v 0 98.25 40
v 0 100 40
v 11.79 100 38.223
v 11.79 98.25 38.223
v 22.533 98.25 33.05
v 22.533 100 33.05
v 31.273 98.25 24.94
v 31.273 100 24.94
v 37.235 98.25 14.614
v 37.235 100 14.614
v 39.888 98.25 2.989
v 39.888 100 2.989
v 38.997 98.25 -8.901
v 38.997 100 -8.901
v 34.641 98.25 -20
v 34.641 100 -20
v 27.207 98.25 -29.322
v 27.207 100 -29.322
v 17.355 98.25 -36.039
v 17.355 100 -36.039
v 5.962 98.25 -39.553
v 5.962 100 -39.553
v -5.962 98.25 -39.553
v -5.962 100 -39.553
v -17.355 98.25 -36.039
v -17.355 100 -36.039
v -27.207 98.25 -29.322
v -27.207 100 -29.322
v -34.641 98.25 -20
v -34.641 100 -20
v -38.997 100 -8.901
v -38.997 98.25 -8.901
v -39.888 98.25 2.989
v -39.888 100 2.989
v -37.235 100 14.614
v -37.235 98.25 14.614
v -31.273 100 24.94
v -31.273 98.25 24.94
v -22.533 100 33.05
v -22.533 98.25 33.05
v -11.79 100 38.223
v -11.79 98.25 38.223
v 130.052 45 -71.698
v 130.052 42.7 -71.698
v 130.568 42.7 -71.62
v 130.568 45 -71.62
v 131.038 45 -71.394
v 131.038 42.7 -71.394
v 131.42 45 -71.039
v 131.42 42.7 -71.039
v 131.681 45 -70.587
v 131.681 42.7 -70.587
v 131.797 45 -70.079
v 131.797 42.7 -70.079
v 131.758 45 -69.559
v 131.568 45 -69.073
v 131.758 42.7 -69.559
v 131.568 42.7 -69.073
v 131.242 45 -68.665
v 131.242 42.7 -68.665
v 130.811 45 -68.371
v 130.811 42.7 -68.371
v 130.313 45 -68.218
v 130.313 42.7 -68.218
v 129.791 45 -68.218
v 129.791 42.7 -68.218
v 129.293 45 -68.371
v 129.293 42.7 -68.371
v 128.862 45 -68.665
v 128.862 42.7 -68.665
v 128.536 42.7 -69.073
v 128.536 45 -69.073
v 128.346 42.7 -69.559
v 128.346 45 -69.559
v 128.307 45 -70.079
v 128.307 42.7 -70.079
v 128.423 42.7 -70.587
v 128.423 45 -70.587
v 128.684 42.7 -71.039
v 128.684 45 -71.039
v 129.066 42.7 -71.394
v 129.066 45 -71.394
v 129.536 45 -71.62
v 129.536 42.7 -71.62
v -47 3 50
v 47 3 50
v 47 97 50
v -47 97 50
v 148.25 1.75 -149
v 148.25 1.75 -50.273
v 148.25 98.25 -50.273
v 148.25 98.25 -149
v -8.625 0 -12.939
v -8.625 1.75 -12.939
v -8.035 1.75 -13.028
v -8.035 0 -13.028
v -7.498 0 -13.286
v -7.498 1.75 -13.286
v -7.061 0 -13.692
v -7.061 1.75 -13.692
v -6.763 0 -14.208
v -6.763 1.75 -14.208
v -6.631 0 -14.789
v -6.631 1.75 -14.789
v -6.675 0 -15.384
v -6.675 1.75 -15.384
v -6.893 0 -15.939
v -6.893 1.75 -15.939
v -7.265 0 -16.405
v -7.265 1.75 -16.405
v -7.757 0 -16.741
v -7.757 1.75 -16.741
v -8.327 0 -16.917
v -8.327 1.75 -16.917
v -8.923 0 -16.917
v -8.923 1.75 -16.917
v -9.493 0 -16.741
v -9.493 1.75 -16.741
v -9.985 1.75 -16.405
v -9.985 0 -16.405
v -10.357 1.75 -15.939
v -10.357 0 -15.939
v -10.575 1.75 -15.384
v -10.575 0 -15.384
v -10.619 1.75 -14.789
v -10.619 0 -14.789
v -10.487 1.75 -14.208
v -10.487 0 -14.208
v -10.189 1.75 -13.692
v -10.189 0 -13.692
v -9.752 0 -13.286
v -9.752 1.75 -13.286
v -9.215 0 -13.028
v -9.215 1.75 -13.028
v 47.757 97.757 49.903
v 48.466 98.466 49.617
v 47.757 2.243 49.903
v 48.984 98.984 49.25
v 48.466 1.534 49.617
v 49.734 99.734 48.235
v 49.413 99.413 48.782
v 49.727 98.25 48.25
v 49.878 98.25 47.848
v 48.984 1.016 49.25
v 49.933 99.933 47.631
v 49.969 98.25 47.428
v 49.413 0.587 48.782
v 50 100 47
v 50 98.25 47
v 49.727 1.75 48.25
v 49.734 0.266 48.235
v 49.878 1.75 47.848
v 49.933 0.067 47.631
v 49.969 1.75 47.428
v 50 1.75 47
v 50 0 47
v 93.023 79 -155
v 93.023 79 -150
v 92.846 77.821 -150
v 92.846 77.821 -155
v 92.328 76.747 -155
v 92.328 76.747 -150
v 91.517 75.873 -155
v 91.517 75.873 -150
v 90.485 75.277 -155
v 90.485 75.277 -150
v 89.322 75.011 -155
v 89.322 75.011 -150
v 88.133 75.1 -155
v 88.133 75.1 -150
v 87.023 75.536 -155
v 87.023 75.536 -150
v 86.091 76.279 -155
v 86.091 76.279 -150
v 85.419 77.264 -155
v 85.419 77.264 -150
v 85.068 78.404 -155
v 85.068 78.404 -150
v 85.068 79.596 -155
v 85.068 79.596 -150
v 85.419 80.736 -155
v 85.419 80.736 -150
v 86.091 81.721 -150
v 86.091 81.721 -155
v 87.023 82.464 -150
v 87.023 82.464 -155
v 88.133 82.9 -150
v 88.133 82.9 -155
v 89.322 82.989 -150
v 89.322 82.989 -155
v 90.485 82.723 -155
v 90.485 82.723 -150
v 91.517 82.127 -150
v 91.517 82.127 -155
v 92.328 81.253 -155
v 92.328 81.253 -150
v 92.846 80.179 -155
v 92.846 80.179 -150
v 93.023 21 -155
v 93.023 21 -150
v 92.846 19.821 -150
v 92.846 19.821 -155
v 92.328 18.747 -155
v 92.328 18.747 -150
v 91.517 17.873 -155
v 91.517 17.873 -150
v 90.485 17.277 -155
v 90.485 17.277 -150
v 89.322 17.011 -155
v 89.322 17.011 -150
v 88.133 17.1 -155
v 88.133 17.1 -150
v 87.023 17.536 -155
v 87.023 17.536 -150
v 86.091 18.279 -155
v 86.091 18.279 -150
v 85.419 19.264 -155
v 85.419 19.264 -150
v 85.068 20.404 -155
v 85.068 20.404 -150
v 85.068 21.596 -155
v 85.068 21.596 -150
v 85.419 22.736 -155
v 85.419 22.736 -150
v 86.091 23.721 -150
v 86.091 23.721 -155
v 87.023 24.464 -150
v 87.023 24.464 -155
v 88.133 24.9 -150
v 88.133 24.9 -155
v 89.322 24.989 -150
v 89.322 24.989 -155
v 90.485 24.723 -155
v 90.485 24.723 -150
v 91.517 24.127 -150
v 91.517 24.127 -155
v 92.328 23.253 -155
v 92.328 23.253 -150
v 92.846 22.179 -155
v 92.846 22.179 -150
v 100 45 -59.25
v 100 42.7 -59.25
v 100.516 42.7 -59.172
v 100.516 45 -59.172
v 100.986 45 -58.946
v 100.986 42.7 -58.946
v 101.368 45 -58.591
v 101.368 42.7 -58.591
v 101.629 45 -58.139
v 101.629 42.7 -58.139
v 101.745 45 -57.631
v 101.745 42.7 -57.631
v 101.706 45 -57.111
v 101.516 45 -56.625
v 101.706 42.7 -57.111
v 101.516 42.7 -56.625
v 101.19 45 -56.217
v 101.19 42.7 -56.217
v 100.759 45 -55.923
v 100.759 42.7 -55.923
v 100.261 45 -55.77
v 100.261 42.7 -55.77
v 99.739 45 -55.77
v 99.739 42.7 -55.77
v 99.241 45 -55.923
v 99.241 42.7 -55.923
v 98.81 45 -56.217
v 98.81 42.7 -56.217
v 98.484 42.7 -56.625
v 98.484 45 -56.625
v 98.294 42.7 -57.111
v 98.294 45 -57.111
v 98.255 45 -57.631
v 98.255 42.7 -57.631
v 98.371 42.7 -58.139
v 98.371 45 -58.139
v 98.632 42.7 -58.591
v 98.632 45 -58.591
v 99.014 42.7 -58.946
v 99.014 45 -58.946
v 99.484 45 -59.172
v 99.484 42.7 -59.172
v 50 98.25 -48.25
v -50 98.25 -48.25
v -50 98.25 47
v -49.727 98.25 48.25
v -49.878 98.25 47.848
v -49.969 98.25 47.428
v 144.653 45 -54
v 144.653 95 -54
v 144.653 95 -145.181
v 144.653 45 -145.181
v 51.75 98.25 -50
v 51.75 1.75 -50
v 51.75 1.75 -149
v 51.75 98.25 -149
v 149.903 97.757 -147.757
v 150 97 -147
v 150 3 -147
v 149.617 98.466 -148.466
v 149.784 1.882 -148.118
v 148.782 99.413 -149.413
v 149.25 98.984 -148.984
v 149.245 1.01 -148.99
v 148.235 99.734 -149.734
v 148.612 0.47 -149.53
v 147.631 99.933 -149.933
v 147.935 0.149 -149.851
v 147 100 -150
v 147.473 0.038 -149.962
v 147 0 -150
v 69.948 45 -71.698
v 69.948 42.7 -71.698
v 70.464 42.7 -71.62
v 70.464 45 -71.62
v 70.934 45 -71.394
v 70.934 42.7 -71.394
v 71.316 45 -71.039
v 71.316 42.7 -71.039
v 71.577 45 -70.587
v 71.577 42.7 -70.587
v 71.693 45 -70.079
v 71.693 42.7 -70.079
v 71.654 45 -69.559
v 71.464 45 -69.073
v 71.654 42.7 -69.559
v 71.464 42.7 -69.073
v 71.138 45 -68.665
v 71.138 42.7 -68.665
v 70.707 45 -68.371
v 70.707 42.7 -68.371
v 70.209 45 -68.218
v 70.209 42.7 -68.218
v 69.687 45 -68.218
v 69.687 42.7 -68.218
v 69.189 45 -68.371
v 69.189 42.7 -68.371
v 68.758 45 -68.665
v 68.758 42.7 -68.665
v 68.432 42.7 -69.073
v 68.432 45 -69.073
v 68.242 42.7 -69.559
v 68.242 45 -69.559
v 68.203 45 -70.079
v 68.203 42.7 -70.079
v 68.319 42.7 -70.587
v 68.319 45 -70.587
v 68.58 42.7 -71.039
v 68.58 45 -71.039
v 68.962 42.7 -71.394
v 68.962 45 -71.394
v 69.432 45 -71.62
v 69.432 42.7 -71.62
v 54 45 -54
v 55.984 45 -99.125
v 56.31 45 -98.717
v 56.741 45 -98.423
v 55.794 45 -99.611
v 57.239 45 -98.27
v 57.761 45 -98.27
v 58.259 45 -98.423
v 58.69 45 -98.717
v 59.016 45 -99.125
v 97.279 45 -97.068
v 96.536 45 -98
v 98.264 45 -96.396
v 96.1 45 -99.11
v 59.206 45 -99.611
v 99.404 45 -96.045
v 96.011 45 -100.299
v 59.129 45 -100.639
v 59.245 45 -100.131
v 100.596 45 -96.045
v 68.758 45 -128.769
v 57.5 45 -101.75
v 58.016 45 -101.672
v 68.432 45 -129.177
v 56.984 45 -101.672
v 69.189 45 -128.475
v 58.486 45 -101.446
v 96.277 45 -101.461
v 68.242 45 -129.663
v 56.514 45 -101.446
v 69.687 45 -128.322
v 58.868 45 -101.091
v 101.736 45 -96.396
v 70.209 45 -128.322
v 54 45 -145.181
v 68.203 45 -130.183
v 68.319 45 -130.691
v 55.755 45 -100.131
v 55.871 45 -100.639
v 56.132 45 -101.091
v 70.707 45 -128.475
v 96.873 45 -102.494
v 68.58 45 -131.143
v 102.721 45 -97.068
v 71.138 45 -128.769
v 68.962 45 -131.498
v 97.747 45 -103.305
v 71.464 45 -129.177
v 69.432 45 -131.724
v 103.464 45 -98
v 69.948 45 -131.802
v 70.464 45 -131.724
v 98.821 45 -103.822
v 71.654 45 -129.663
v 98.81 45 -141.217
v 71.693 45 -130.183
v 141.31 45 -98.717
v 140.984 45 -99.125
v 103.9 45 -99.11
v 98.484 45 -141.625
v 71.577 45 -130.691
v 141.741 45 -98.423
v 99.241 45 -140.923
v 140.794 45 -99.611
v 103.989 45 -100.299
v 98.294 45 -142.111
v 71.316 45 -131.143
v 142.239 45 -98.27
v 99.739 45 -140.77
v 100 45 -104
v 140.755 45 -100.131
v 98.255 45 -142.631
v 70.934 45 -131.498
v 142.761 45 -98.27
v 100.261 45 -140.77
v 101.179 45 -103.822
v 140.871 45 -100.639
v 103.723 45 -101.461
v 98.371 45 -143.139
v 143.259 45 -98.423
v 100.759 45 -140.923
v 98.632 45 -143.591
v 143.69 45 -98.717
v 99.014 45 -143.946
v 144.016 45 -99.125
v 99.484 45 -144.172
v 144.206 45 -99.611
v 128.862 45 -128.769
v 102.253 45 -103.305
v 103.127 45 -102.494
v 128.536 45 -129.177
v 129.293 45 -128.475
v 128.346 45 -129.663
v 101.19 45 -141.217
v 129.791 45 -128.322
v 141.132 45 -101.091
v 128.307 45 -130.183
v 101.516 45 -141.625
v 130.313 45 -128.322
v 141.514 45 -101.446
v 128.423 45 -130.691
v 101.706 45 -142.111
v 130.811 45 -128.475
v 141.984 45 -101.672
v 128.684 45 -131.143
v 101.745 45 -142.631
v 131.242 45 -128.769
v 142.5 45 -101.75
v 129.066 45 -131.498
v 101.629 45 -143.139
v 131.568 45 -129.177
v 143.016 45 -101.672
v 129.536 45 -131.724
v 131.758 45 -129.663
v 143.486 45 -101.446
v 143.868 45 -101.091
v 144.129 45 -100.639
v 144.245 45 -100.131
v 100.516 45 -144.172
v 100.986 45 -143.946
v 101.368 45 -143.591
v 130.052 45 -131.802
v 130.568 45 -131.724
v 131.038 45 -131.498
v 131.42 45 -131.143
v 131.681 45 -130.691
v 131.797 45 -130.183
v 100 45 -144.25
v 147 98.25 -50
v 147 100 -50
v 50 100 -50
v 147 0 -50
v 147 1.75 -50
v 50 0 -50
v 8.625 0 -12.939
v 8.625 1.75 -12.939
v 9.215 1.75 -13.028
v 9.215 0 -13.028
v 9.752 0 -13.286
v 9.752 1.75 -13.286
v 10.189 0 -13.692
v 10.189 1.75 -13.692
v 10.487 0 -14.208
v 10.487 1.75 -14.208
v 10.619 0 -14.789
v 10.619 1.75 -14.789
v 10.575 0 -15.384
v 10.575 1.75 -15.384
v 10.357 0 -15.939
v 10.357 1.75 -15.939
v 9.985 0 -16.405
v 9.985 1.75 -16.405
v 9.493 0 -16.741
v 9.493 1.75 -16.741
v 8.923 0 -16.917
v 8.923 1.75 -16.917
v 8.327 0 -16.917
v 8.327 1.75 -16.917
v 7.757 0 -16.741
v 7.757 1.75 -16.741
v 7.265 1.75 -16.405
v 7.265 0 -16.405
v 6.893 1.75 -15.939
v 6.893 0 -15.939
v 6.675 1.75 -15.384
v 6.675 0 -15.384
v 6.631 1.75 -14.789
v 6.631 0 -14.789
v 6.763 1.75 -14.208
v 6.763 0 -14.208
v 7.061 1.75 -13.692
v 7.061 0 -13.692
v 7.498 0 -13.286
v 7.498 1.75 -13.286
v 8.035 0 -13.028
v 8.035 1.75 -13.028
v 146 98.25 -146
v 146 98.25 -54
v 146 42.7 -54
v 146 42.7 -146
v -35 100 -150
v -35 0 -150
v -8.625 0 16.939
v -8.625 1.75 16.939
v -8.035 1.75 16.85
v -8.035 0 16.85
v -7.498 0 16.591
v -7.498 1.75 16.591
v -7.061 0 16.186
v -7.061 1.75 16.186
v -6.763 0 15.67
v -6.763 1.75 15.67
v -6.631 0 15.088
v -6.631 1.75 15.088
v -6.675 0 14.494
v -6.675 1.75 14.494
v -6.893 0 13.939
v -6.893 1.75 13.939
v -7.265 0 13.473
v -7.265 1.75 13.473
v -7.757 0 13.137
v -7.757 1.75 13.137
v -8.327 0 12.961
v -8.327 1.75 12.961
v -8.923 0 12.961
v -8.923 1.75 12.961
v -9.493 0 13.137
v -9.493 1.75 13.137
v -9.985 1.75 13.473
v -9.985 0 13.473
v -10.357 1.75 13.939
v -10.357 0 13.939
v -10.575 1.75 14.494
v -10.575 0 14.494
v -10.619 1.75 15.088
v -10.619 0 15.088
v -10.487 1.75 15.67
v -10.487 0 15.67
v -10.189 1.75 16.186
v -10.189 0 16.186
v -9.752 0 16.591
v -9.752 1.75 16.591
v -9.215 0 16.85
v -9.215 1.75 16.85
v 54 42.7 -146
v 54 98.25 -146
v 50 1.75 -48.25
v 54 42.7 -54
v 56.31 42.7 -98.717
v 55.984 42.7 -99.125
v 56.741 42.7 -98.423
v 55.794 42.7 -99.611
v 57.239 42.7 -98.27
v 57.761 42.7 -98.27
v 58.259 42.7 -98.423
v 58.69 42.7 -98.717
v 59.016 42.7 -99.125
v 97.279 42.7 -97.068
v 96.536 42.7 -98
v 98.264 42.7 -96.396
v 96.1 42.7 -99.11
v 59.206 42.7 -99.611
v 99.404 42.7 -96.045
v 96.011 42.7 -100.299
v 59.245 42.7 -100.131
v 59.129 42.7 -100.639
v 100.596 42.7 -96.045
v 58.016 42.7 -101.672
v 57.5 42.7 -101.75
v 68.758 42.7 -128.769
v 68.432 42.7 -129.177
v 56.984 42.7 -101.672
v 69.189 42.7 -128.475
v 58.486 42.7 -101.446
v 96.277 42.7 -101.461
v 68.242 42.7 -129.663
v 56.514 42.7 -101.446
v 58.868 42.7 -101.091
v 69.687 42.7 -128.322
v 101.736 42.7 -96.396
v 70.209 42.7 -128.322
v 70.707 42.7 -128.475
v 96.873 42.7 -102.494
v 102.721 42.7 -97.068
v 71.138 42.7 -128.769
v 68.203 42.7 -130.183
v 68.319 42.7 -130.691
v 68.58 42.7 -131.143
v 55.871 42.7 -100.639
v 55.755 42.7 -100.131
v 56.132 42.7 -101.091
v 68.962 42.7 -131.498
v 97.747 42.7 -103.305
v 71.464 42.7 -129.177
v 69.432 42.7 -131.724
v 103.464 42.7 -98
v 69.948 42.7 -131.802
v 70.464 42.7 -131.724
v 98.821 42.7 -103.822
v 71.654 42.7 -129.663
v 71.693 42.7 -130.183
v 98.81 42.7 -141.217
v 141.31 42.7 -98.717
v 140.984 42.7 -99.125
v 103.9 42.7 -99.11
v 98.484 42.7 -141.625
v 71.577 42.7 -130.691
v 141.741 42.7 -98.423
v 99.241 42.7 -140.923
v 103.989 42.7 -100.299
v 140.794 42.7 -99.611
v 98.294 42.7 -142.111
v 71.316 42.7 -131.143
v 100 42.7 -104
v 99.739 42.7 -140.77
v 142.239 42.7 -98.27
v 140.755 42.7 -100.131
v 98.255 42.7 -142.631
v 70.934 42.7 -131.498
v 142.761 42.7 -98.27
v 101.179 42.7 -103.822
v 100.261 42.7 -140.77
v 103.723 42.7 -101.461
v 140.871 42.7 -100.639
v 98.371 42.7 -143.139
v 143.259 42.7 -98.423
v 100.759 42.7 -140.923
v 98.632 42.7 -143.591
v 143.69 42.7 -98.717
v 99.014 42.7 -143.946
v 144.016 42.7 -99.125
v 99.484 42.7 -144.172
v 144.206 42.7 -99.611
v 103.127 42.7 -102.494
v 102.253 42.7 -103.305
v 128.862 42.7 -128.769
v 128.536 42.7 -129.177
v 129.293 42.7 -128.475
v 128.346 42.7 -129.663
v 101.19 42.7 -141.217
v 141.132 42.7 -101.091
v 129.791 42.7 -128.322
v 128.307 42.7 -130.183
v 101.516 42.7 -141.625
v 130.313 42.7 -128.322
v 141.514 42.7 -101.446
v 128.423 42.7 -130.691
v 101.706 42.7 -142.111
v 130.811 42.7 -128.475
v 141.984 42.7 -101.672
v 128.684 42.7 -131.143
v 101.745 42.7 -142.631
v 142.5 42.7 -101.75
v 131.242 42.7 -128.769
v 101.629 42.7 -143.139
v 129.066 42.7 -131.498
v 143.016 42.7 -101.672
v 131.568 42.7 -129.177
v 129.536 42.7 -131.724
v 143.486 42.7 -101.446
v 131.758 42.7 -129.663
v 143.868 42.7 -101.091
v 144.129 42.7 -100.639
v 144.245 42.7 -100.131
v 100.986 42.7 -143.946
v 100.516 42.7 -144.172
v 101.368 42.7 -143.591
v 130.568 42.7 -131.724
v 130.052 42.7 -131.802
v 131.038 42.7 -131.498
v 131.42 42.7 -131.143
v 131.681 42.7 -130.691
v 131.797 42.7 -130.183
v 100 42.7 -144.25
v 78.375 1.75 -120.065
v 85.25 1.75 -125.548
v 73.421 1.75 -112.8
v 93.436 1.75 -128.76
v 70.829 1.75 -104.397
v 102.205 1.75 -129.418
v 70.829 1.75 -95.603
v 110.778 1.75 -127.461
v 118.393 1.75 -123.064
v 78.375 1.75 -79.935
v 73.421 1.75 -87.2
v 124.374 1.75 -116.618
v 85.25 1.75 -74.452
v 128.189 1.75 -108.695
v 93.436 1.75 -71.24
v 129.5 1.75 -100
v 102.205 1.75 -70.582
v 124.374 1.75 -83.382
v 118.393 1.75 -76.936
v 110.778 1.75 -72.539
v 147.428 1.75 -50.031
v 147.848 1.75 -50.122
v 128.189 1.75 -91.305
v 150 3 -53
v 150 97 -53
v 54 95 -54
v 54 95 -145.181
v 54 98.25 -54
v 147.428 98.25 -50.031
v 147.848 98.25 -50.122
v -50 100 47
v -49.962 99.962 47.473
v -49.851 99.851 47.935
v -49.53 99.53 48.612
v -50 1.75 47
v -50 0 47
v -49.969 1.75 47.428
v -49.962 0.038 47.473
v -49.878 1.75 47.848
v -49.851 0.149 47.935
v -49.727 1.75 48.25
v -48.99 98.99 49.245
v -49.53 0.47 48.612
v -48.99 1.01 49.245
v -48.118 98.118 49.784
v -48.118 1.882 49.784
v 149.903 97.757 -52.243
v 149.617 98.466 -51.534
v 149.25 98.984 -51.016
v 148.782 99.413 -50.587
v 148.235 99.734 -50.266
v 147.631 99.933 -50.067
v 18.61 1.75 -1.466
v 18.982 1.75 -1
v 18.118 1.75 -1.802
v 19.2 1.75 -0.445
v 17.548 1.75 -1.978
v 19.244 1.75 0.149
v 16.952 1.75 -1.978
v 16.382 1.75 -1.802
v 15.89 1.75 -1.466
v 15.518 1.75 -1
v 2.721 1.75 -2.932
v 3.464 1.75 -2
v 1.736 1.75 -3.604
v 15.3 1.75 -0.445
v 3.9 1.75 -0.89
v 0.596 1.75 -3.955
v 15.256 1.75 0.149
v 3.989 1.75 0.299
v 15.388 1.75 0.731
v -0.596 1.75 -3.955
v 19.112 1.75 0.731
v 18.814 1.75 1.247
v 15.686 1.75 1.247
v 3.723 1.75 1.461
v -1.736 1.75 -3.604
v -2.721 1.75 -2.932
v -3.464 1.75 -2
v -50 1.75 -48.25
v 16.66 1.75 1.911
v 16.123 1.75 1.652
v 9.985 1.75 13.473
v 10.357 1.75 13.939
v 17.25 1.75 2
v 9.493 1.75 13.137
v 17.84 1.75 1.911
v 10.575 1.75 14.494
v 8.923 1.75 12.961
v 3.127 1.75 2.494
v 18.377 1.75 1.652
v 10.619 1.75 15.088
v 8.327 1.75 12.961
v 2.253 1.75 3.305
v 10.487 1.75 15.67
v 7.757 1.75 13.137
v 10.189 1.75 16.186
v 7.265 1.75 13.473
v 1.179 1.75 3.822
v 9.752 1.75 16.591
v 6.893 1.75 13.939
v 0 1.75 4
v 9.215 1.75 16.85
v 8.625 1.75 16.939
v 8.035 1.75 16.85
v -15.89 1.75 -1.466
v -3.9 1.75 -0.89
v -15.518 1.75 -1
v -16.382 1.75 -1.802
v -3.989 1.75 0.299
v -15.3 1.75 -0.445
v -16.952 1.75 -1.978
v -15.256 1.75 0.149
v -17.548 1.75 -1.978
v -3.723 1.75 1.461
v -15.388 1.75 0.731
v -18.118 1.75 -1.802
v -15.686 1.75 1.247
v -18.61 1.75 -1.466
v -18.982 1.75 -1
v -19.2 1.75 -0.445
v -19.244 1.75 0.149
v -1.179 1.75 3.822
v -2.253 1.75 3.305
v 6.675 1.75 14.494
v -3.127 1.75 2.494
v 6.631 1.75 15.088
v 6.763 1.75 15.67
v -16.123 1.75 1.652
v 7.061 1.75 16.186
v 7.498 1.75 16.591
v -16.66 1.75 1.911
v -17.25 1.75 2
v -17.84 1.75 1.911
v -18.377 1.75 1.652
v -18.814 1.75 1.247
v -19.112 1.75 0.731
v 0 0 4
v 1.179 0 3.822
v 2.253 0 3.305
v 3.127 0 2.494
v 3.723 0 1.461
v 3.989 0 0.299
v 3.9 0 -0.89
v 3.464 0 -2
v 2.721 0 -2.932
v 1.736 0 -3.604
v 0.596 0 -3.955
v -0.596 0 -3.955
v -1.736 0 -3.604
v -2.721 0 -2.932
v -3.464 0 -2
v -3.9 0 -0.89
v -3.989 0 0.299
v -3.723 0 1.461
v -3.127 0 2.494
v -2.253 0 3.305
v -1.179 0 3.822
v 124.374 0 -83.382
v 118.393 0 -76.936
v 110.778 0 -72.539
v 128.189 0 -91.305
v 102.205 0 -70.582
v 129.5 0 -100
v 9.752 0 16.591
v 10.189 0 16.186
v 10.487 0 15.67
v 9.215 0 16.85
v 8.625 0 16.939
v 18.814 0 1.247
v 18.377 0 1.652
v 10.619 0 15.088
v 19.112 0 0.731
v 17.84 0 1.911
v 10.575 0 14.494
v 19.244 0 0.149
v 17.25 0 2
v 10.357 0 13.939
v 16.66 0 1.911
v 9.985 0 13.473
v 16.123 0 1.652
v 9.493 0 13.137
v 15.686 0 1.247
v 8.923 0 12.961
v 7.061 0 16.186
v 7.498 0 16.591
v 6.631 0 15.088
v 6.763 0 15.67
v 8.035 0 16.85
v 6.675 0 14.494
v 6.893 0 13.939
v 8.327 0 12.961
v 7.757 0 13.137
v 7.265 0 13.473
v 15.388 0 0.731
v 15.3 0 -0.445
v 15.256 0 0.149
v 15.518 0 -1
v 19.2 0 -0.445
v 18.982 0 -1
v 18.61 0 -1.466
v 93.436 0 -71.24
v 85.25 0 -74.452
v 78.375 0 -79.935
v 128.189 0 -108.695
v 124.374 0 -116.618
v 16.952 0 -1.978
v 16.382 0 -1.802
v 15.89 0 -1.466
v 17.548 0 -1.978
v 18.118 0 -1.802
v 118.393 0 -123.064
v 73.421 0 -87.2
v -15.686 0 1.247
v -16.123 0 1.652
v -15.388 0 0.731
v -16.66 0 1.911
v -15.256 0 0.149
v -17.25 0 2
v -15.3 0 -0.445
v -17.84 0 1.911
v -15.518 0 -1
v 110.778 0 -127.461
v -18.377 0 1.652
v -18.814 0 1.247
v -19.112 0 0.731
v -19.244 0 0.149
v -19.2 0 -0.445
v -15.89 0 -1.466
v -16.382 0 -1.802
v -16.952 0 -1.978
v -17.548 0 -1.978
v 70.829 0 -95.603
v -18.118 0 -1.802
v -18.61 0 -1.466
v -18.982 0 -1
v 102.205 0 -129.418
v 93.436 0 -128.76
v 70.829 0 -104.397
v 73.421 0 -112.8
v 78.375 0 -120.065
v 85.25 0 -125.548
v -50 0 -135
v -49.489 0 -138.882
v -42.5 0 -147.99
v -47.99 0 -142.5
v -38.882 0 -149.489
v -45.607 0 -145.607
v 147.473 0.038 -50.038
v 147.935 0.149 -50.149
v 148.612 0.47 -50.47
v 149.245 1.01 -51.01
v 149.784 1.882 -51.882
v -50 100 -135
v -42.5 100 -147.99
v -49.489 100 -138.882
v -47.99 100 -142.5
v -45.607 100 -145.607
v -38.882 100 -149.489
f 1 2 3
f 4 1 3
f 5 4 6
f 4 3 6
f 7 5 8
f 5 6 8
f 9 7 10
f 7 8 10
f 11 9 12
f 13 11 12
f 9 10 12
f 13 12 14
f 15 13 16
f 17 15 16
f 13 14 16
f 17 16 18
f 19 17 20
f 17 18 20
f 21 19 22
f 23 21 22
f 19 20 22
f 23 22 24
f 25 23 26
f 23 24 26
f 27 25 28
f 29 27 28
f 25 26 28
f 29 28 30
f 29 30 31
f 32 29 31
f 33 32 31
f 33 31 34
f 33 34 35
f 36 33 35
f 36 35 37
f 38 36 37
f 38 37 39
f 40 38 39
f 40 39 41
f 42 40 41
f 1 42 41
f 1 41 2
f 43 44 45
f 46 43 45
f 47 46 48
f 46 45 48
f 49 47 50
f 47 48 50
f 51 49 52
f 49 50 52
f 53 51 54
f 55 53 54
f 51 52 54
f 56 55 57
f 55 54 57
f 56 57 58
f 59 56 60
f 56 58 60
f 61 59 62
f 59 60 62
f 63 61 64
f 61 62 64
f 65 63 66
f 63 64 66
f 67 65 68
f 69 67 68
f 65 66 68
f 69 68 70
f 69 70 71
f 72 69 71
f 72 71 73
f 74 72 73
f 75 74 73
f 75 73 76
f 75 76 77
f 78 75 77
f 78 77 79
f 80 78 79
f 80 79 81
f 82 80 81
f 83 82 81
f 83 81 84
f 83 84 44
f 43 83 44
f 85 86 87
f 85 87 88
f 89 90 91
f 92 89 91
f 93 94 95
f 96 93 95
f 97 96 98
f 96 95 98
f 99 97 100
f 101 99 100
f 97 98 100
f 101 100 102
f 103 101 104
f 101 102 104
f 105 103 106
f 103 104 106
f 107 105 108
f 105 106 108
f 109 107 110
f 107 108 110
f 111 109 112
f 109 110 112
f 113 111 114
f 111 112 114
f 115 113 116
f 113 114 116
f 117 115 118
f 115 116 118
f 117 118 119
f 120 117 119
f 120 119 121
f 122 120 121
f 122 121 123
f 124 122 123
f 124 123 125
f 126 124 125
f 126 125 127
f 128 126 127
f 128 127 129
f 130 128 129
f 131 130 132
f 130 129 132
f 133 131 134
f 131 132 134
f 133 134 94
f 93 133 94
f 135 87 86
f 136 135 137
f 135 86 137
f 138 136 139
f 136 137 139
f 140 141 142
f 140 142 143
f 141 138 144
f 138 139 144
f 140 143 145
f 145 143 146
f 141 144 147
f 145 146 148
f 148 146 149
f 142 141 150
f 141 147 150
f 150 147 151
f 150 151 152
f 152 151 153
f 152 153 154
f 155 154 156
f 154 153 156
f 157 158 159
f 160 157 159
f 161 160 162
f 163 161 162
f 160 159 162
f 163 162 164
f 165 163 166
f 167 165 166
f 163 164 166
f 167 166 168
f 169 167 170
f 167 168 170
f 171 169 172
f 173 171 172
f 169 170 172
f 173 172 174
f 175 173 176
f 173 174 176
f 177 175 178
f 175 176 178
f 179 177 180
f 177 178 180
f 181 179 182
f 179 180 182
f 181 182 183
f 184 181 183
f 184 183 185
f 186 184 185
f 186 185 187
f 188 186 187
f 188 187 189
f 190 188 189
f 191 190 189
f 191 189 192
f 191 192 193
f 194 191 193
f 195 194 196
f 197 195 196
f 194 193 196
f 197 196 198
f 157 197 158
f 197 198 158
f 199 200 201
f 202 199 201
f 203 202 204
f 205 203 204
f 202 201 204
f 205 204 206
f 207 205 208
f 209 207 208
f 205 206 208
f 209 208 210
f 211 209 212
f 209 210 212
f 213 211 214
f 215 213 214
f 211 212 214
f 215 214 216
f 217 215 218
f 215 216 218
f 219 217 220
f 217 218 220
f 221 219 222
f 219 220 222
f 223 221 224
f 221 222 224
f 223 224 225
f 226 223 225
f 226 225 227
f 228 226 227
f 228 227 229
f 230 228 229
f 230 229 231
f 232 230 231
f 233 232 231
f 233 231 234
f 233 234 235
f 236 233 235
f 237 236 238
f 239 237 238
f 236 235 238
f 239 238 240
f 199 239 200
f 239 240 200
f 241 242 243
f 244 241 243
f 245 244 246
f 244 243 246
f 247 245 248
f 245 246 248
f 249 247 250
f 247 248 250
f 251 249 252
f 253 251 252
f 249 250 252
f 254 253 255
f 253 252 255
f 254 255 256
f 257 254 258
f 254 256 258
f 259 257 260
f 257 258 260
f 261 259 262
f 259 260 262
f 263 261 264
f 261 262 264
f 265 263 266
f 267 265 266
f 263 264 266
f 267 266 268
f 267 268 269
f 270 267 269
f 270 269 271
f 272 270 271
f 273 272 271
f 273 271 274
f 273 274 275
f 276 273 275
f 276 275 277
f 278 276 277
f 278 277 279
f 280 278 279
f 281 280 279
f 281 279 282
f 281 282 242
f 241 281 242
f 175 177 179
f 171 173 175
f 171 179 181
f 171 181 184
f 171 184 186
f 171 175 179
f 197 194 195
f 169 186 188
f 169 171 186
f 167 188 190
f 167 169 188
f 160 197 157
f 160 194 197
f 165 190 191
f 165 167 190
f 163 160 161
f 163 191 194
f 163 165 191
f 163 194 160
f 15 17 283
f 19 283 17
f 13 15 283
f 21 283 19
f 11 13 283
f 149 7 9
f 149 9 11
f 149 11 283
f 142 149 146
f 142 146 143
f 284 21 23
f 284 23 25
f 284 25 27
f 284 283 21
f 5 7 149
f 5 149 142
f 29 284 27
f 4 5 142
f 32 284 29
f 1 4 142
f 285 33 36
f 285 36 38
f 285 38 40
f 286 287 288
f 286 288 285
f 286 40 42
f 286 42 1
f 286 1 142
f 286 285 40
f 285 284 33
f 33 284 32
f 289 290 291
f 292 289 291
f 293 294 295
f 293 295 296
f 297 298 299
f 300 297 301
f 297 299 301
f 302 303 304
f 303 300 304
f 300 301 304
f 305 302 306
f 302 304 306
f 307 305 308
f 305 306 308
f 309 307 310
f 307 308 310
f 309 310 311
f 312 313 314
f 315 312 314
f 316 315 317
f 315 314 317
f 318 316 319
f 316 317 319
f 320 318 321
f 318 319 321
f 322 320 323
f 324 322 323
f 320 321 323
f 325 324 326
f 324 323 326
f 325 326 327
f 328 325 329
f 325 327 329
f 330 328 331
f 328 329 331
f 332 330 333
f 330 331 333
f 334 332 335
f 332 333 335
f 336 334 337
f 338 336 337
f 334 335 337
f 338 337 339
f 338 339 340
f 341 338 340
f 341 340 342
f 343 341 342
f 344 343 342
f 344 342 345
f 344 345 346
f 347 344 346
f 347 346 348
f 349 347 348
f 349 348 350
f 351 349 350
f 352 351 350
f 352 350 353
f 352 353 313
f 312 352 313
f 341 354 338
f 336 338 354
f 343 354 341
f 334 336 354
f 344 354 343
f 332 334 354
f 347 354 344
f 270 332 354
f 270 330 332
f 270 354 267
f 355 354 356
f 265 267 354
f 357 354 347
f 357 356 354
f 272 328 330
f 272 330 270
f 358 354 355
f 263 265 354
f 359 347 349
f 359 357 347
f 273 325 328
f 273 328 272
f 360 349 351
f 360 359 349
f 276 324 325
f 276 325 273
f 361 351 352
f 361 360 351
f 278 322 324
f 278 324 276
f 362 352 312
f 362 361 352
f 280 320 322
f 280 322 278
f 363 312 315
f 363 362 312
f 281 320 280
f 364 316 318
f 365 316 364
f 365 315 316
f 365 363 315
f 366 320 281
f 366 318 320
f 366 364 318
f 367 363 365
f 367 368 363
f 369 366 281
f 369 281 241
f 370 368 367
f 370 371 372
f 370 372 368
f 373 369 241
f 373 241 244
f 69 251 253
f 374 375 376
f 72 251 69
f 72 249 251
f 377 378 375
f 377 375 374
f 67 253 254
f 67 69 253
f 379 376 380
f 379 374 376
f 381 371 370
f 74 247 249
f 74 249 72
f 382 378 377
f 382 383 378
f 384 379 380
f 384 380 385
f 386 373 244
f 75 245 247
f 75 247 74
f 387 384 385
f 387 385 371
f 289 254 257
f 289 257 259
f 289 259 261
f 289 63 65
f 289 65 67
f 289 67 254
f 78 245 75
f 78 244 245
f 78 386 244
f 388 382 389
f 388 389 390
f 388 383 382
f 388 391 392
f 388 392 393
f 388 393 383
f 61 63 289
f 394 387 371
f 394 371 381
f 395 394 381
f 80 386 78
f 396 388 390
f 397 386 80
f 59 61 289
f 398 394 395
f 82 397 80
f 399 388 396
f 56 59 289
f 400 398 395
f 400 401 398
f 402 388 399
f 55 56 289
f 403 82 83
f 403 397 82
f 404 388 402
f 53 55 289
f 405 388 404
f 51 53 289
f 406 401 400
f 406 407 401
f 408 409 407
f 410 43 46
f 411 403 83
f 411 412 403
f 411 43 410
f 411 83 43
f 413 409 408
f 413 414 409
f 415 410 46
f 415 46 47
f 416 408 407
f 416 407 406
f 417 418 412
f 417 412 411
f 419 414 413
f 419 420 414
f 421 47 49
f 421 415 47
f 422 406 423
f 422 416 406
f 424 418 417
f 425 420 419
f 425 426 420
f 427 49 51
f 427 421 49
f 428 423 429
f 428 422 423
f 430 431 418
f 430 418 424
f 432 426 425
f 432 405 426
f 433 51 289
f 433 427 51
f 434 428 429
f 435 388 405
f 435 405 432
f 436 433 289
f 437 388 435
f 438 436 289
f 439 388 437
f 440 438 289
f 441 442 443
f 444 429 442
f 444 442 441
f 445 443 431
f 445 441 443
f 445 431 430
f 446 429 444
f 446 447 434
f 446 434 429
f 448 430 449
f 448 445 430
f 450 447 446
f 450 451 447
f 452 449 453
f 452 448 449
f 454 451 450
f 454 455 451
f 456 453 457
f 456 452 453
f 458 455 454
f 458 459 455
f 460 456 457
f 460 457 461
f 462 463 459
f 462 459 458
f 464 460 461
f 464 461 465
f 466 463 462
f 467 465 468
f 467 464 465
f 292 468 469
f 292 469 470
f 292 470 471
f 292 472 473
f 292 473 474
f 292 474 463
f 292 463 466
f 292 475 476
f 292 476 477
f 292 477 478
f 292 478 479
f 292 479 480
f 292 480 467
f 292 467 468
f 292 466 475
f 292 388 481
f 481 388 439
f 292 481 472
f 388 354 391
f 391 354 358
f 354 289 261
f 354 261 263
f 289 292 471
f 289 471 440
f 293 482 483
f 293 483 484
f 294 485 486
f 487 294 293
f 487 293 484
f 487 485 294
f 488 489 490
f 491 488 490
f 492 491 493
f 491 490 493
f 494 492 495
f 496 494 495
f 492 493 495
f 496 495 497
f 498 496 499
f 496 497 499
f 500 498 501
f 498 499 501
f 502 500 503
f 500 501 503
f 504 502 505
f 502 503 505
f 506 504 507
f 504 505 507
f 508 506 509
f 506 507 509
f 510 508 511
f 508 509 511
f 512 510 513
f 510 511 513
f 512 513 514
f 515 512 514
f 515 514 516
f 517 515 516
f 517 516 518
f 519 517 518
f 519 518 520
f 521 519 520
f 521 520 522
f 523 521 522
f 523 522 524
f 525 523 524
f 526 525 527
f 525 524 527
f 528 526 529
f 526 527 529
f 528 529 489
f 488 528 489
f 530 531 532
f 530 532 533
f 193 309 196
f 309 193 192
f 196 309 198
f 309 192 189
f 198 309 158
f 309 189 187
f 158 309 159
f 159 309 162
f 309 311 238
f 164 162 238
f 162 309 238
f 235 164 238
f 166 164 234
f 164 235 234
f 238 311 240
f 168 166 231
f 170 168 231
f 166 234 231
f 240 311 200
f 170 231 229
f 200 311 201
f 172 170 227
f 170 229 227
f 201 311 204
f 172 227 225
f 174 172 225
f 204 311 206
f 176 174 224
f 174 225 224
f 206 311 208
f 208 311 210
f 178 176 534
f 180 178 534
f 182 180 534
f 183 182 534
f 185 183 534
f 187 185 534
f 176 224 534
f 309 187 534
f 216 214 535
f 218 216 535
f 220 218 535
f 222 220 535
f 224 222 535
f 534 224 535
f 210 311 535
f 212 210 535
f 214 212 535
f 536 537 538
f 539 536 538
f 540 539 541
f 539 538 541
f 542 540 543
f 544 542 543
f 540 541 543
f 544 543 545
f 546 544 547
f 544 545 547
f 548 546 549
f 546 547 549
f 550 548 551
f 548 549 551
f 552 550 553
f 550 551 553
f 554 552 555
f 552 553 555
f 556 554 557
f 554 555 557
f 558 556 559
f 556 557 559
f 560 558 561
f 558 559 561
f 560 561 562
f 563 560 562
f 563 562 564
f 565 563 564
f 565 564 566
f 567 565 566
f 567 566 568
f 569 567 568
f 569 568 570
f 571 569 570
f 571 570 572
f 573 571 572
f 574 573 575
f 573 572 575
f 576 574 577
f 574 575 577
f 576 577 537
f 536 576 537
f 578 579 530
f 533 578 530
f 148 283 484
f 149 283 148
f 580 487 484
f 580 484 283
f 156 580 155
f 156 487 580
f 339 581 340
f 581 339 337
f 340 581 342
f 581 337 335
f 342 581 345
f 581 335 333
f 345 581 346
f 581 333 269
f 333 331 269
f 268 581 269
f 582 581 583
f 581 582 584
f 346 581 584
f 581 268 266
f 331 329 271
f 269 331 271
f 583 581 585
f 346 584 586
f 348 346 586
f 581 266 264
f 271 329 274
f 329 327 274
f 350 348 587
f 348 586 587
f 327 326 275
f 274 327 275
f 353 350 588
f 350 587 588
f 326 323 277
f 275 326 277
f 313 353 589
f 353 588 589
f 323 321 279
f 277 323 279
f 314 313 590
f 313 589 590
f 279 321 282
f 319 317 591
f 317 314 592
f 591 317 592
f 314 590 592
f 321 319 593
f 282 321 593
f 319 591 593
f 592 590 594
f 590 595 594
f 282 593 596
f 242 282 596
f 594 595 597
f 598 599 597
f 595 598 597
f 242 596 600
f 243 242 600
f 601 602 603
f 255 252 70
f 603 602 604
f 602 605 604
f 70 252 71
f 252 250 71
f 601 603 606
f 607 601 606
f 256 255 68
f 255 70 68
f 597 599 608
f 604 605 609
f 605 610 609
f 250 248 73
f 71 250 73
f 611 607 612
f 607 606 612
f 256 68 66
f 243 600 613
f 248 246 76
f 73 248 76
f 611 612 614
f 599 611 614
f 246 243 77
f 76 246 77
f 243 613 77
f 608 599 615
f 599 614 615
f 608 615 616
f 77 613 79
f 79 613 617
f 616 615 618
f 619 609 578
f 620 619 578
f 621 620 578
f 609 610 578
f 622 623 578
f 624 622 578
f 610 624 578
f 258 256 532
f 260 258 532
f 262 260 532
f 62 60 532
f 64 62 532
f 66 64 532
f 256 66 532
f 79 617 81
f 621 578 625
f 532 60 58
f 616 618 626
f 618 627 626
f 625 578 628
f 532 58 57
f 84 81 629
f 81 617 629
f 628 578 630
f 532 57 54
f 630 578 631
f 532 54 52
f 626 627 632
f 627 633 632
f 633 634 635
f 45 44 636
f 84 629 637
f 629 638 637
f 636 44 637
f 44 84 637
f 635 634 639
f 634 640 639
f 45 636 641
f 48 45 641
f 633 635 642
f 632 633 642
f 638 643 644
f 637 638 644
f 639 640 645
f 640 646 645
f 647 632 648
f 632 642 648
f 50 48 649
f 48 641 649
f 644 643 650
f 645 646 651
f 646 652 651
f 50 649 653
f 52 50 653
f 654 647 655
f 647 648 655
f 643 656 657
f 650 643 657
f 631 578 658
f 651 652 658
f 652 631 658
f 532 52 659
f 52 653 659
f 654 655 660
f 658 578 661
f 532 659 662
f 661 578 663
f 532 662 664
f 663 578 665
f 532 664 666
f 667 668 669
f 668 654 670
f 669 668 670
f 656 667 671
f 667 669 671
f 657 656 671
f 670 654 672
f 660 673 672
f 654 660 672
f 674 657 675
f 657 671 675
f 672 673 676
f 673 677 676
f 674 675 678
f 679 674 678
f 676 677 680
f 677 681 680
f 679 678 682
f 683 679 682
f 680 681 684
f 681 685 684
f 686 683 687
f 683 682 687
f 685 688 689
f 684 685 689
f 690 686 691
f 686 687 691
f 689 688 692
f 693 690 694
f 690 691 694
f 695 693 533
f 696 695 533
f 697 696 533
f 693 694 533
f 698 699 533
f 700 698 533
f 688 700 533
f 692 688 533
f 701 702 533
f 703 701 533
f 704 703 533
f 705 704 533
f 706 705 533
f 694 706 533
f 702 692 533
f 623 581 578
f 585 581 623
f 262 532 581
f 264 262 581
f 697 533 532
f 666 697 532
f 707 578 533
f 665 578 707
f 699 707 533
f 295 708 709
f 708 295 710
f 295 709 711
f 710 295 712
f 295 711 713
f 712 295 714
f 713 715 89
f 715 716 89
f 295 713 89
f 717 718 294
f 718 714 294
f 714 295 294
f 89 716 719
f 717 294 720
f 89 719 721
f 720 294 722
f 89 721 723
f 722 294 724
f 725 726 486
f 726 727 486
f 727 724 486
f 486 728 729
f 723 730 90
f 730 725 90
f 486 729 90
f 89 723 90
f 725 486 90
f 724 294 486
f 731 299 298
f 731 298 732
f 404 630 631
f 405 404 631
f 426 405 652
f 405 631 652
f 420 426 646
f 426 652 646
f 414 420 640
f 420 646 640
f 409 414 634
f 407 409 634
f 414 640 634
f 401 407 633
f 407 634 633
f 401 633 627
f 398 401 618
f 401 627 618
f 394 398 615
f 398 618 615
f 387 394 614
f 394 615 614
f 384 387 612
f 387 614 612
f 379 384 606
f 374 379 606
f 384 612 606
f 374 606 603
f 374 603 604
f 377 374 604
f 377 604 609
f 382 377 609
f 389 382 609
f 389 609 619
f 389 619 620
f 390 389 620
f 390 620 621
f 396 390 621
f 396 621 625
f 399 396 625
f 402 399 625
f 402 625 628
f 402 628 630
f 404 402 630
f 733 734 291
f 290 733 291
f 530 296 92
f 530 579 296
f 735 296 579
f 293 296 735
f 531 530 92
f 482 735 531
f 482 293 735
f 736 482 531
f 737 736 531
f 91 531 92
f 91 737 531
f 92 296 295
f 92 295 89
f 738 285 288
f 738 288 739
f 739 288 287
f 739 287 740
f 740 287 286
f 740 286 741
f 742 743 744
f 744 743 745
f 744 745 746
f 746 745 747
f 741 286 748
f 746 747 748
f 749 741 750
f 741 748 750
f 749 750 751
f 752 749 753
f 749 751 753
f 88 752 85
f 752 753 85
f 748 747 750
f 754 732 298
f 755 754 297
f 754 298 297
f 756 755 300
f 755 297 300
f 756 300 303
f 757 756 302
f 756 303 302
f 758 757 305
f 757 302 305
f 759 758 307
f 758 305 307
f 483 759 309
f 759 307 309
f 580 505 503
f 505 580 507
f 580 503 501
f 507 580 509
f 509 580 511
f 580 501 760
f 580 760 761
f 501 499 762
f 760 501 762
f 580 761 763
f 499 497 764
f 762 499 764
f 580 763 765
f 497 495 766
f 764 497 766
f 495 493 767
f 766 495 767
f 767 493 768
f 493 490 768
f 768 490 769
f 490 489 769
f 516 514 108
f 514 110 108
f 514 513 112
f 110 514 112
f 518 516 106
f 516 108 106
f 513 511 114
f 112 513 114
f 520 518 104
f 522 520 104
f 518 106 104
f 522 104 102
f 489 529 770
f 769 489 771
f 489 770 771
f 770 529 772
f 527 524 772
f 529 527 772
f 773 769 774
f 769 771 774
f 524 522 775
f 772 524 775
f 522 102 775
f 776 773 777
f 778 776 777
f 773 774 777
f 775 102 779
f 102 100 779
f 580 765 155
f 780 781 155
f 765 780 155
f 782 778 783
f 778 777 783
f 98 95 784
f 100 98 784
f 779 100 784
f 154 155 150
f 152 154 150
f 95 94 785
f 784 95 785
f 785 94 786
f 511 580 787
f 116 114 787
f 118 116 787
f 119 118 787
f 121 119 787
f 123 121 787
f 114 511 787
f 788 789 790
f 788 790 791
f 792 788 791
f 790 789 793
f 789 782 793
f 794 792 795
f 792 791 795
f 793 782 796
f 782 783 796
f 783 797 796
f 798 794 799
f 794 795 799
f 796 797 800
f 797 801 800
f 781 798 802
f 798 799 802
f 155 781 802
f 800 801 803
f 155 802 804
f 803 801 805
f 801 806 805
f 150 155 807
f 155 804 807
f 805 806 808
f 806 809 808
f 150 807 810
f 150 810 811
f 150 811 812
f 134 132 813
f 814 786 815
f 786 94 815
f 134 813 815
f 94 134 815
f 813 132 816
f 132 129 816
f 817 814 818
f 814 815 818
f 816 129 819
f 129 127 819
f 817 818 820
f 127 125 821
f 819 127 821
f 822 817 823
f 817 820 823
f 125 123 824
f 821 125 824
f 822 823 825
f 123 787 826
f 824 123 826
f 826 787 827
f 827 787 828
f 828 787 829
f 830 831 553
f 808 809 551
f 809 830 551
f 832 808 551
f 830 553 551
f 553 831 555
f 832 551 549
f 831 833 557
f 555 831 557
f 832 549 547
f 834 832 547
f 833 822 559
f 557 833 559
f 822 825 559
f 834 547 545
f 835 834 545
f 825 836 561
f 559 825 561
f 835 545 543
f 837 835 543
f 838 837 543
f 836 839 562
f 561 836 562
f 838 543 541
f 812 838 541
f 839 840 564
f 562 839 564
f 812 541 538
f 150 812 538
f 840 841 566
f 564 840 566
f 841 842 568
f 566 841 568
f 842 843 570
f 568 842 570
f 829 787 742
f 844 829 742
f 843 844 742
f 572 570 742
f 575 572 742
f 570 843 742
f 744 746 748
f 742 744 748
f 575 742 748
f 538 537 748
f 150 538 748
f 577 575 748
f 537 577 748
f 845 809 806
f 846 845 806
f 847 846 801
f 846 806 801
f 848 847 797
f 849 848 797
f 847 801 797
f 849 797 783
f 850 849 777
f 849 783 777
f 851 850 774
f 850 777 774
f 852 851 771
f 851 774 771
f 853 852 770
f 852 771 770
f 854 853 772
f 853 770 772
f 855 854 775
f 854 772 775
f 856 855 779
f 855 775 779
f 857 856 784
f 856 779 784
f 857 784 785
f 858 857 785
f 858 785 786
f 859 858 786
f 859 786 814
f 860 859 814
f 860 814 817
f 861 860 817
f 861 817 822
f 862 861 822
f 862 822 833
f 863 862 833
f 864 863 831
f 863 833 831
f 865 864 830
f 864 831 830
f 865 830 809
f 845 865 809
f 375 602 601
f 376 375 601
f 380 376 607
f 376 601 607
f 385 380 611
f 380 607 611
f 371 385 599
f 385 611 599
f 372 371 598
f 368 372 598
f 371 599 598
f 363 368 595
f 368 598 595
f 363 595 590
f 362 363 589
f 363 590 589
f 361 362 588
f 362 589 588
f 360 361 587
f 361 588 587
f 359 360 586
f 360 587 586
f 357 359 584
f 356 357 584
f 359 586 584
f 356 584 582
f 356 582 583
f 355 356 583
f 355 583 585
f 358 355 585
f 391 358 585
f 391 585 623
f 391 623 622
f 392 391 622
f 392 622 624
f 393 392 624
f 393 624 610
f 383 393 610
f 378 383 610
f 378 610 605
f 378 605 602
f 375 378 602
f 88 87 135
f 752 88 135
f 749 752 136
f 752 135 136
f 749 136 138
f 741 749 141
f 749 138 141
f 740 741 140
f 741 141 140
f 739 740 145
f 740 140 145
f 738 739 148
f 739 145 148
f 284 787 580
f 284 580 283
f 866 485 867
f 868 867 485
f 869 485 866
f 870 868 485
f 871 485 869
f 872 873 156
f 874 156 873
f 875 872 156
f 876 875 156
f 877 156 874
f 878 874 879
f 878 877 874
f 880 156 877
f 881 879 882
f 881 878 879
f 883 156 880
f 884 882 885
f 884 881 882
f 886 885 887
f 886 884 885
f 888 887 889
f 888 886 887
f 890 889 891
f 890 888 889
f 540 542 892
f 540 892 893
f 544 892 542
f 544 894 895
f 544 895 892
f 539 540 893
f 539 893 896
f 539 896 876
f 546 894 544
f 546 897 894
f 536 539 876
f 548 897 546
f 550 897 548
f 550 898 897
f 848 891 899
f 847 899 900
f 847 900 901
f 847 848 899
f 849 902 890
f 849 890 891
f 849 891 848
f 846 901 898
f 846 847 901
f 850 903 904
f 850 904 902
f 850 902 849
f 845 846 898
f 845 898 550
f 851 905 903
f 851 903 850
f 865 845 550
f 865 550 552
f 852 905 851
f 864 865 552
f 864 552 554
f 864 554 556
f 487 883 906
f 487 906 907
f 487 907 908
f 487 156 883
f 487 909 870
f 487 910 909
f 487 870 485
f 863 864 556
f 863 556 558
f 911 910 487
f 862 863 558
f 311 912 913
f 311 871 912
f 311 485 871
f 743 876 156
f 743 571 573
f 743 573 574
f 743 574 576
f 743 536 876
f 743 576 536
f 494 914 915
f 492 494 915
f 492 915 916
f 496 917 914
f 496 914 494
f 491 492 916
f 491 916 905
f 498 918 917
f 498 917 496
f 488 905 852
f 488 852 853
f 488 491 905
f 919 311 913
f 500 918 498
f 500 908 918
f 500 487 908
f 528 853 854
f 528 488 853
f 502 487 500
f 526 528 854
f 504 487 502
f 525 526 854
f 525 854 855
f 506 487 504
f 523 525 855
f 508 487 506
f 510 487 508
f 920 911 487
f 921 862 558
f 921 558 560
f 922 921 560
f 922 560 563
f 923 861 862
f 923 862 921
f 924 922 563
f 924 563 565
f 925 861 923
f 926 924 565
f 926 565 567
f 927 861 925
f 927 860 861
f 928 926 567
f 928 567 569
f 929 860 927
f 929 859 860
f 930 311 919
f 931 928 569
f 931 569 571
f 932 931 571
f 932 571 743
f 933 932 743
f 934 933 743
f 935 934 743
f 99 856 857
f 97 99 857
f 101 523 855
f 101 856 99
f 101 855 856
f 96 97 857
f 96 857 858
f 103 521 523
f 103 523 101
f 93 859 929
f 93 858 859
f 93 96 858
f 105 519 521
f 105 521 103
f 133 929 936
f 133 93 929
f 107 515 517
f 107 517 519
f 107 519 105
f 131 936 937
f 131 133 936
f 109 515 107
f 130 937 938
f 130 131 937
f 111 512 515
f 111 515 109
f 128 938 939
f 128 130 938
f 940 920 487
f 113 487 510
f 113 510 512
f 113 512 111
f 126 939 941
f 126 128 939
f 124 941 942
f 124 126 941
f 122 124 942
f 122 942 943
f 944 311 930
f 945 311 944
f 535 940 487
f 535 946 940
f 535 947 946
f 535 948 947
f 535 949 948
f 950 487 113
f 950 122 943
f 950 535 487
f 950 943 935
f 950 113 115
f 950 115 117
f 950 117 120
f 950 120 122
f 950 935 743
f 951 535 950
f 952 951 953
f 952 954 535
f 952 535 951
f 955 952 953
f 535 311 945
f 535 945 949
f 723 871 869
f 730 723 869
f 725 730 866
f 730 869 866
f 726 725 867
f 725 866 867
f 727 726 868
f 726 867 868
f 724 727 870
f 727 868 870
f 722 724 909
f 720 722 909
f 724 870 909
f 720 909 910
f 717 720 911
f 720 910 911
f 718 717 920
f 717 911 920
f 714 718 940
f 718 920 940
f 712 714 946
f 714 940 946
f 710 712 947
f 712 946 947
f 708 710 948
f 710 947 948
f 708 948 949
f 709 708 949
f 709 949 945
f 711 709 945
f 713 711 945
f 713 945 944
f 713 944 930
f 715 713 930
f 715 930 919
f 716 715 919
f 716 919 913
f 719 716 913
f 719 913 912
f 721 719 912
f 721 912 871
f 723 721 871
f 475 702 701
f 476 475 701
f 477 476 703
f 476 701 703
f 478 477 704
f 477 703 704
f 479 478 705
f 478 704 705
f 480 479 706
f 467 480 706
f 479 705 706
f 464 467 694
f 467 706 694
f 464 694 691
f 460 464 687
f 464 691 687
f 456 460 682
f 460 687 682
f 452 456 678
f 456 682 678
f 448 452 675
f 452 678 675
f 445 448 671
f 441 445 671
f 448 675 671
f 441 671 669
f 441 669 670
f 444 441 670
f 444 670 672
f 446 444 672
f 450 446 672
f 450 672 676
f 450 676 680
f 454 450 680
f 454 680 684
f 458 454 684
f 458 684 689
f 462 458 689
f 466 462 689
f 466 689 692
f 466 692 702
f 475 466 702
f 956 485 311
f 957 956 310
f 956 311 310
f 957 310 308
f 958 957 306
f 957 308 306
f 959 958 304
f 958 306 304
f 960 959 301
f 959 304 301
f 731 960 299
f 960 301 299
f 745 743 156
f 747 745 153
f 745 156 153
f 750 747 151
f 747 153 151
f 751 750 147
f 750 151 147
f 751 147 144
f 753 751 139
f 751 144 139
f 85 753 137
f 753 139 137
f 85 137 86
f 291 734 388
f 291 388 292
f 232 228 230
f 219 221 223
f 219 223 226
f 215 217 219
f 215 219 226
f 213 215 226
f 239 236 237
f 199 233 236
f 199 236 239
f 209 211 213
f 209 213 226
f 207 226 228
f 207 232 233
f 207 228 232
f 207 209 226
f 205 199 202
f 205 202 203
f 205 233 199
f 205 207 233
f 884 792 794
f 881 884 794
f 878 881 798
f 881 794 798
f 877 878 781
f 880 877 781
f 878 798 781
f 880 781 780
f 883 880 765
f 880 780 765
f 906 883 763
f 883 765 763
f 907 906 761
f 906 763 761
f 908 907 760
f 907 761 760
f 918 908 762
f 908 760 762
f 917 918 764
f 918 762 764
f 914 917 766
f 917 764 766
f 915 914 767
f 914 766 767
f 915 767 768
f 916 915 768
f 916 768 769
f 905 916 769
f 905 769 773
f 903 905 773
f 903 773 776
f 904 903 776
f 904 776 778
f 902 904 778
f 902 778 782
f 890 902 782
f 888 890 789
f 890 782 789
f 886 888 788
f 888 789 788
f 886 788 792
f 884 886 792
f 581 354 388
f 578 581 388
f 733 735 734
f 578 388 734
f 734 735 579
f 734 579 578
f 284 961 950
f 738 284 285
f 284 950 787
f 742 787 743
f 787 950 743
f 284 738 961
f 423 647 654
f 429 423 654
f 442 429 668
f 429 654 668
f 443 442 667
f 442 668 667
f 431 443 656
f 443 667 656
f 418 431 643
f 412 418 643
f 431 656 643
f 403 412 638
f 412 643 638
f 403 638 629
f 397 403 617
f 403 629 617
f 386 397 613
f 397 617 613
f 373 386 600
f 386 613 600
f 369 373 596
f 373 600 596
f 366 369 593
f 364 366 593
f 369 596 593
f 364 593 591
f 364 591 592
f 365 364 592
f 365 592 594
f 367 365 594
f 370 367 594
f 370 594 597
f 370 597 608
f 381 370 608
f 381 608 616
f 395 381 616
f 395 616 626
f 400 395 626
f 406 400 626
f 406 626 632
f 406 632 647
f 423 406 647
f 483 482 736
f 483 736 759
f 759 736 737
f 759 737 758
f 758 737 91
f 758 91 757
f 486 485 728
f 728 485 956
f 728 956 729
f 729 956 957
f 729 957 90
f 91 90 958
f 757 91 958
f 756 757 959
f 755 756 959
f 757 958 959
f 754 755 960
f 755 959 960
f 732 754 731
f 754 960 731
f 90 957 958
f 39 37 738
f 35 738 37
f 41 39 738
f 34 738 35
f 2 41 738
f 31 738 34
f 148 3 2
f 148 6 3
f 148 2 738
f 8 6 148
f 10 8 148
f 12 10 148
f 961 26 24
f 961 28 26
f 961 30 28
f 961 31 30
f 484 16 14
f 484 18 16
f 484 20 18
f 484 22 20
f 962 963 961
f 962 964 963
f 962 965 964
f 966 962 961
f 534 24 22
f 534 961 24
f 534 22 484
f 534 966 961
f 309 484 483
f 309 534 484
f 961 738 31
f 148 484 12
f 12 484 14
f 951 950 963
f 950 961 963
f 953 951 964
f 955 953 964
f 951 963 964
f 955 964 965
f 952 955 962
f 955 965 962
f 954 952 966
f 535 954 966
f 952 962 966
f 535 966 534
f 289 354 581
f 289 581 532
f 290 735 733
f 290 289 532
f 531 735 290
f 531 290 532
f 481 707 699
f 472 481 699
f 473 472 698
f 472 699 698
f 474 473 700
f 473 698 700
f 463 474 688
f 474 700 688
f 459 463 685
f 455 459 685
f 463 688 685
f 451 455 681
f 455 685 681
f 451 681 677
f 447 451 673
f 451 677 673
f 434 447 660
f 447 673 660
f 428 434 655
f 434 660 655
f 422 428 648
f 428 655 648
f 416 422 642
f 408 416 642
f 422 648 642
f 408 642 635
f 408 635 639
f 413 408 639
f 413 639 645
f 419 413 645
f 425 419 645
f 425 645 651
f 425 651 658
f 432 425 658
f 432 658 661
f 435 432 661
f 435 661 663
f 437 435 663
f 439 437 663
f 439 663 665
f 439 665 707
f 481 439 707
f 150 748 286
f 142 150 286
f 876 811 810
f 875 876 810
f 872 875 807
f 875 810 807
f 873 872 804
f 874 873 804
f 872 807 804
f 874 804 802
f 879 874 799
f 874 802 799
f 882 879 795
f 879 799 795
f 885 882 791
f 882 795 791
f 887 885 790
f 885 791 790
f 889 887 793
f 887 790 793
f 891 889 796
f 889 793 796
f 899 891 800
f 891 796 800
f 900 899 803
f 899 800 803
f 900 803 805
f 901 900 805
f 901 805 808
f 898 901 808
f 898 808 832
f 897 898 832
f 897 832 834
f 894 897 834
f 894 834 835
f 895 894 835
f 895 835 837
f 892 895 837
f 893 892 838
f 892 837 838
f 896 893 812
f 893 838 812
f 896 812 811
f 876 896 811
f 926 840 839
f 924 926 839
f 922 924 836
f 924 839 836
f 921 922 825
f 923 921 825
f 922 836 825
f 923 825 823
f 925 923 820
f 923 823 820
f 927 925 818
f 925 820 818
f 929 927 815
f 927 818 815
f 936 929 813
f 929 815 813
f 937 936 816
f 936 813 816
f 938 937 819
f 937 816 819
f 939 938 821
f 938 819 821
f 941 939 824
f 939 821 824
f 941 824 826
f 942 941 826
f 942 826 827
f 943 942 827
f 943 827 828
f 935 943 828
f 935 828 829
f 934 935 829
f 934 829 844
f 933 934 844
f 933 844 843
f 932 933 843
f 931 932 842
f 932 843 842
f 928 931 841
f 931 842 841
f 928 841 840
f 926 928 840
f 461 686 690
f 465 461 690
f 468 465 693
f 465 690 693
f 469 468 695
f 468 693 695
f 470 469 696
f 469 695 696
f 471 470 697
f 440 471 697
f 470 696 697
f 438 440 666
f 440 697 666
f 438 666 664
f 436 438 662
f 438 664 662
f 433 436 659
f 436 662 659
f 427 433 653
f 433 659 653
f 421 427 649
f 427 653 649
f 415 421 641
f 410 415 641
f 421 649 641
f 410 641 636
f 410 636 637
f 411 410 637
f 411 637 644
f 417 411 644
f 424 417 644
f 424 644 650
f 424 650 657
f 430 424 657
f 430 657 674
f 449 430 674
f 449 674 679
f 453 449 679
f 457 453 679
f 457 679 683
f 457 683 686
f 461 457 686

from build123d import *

# Parameters (mm, degrees)
EXTRUDE_1_DEPTH      = 100
SKETCH_2_R           = 40
CUT_EXTRUDE_1_DEPTH  = 90
SKETCH_9_W           = 96.5
SKETCH_9_H           = 96.5
CUT_EXTRUDE_3_DEPTH  = 100
SKETCH_15_R          = 4
EXTRUDE_4_DEPTH      = 5
SKETCH_16_R          = 29.5
CUT_EXTRUDE_5_DEPTH  = 5
SKETCH_19_W          = 96.5
SKETCH_19_H          = 96.5
CUT_EXTRUDE_8_DEPTH  = 99
SKETCH_20_R          = 2
SKETCH_20_R_2        = 4
CUT_EXTRUDE_9_DEPTH  = 1.75
SKETCH_23_W          = 92
SKETCH_23_H          = 92
EXTRUDE_5_DEPTH      = 57.3
SKETCH_24_R          = 1.75
SKETCH_24_R_2        = 4
CUT_EXTRUDE_10_DEPTH = 3
CUT_EXTRUDE_START    = -5
SKETCH_27_W          = 92
SKETCH_27_H          = 92
CUT_EXTRUDE_12_DEPTH = 50
FILLET_2_R           = 3
FILLET_6_R           = 15


with BuildPart() as part:
    # 草图1 → 凸台-拉伸1 (new body)
    with BuildSketch(Plane(origin=(0, 0, 0), x_dir=(1, 0, 0), z_dir=(0, 1, 0))):
        Polygon((-50, 50), (-50, 150), (50, 150), (150, 150), (150, 50), (50, 50), (50, -50), (-50, -50), align=None)
    extrude(amount=EXTRUDE_1_DEPTH)

    # 草图2 → 切除-拉伸1 (cut)
    with BuildSketch(Plane(origin=(0, 100, 0), x_dir=(1, 0, 0), z_dir=(0, 1, 0))):
        with Locations(Location((0, 0, 0), (0, 0, 270))):
            Circle(SKETCH_2_R)
    extrude(amount=-CUT_EXTRUDE_1_DEPTH, mode=Mode.SUBTRACT)

    # 草图9 → 切除-拉伸3 (cut)
    with BuildSketch(Plane.ZY.offset(50)):
        with Locations((0, 50)):
            Rectangle(SKETCH_9_W, SKETCH_9_H)
    extrude(amount=-CUT_EXTRUDE_3_DEPTH, mode=Mode.SUBTRACT)

    # 草图15 → 凸台-拉伸4 (add)
    with BuildSketch(Plane(origin=(0, 0, -150), x_dir=(-1, 0, 0), z_dir=(0, 0, -1))):
        with Locations(Location((-89.023351099, 21, 0), (0, 0, 180))):
            Circle(SKETCH_15_R)
        with Locations(Location((-89.023351099, 79, 0), (0, 0, 180))):
            Circle(SKETCH_15_R)
    extrude(amount=EXTRUDE_4_DEPTH)

    # 草图16 → 切除-拉伸5 (cut)
    with BuildSketch(Plane.XZ):
        with Locations((100, -100)):
            Circle(SKETCH_16_R)
    extrude(amount=-CUT_EXTRUDE_5_DEPTH, mode=Mode.SUBTRACT)

    # 草图19 → 切除-拉伸8 (cut)
    with BuildSketch(Plane.XY.offset(-50)):
        with Locations((100, 50)):
            Rectangle(SKETCH_19_W, SKETCH_19_H)
    extrude(amount=-CUT_EXTRUDE_8_DEPTH, mode=Mode.SUBTRACT)

    # 草图20 → 切除-拉伸9 (cut)
    with BuildSketch(Plane(origin=(0, 1.75, 0), x_dir=(1, 0, 0), z_dir=(0, 1, 0))):
        with Locations(Location((17.25, 0, 0), (0, 0, 270))):
            Circle(SKETCH_20_R)
        with Locations(Location((8.625, -14.938938215, 0), (0, 0, 270))):
            Circle(SKETCH_20_R)
        with Locations(Location((-8.625, -14.938938215, 0), (0, 0, 270))):
            Circle(SKETCH_20_R)
        with Locations(Location((-17.25, 0, 0), (0, 0, 270))):
            Circle(SKETCH_20_R)
        with Locations(Location((-8.625, 14.938938215, 0), (0, 0, 270))):
            Circle(SKETCH_20_R)
        with Locations(Location((8.625, 14.938938215, 0), (0, 0, 270))):
            Circle(SKETCH_20_R)
        with Locations(Location((0, 0, 0), (0, 0, 270))):
            Circle(SKETCH_20_R_2)
    extrude(amount=-CUT_EXTRUDE_9_DEPTH, mode=Mode.SUBTRACT)

    # 草图23 → 凸台-拉伸5 (add)
    with BuildSketch(Plane(origin=(0, 100, 0), x_dir=(1, 0, 0), z_dir=(0, 1, 0))):
        with Locations((100, 100)):
            Rectangle(SKETCH_23_W, SKETCH_23_H)
    extrude(amount=-EXTRUDE_5_DEPTH)

    # 草图24 → 切除-拉伸10 (cut)
    with BuildSketch(Plane.XZ.offset(-42.7)):
        with Locations(Location((100, -57.5, 0), (0, 0, 270))):
            Circle(SKETCH_24_R)
        with Locations(Location((130.0520382, -69.9479618, 0), (0, 0, 270))):
            Circle(SKETCH_24_R)
        with Locations(Location((142.5, -100, 0), (0, 0, 270))):
            Circle(SKETCH_24_R)
        with Locations(Location((130.0520382, -130.0520382, 0), (0, 0, 270))):
            Circle(SKETCH_24_R)
        with Locations(Location((100, -142.5, 0), (0, 0, 270))):
            Circle(SKETCH_24_R)
        with Locations(Location((69.9479618, -130.0520382, 0), (0, 0, 270))):
            Circle(SKETCH_24_R)
        with Locations(Location((57.5, -100, 0), (0, 0, 270))):
            Circle(SKETCH_24_R)
        with Locations(Location((69.9479618, -69.9479618, 0), (0, 0, 270))):
            Circle(SKETCH_24_R)
        with Locations(Location((100, -100, 0), (0, 0, 270))):
            Circle(SKETCH_24_R_2)
    extrude(amount=-CUT_EXTRUDE_10_DEPTH, mode=Mode.SUBTRACT)

    # 草图27 → 切除-拉伸12 (cut)
    with BuildSketch(Plane(origin=(0, 100, 0), x_dir=(1, 0, 0), z_dir=(0, 1, 0)).offset(CUT_EXTRUDE_START)):
        with Locations((98.652941691, 99.180600888)):
            Rectangle(SKETCH_27_W, SKETCH_27_H)
    extrude(amount=-CUT_EXTRUDE_12_DEPTH, mode=Mode.SUBTRACT)

    # 圆角2
    # the kernel refuses this fillet: 3 mm, written as the material it takes off along each edge
    with BuildSketch(Plane(origin=(50, -7.5, 50), x_dir=(-1, 0, 0), z_dir=(0, 1, 0)), Plane(origin=(57.5, 0, 50), x_dir=(0, 0, -1), z_dir=(-1, 0, 0)), Plane(origin=(-50, -7.5, 50), x_dir=(0, 0, -1), z_dir=(0, 1, 0)), Plane(origin=(150, 0, -157.5), x_dir=(-1, 0, 0), z_dir=(0, 0, 1))) as fillet_2_piece_1:
        with BuildLine():
            CenterArc((FILLET_2_R, -FILLET_2_R), FILLET_2_R, 90, 90)
            Line((0, -FILLET_2_R), (0, 0))
            Line((0, 0), (FILLET_2_R, 0))
        make_face()
    extrude(amount=115, mode=Mode.SUBTRACT)
    with BuildSketch(Plane(origin=(57.5, 100, 50), x_dir=(0, 0, -1), z_dir=(-1, 0, 0)), Plane(origin=(150, 100, -157.5), x_dir=(-1, 0, 0), z_dir=(0, 0, 1)), Plane(origin=(150, -7.5, -50), x_dir=(0, 0, -1), z_dir=(0, 1, 0)), Plane(origin=(150, -7.5, -150), x_dir=(-1, 0, 0), z_dir=(0, 1, 0))) as fillet_2_piece_2:
        with BuildLine():
            CenterArc((FILLET_2_R, FILLET_2_R), FILLET_2_R, 180, 90)
            Line((0, FILLET_2_R), (0, 0))
            Line((0, 0), (FILLET_2_R, 0))
        make_face()
    extrude(amount=115, mode=Mode.SUBTRACT)

    # 圆角6
    fillet_6_edges = [part.edges().sort_by_distance(p)[0] for p in [
        (-50, 50, -150),
    ]]
    fillet(fillet_6_edges, radius=FILLET_6_R)


solid = part.part
